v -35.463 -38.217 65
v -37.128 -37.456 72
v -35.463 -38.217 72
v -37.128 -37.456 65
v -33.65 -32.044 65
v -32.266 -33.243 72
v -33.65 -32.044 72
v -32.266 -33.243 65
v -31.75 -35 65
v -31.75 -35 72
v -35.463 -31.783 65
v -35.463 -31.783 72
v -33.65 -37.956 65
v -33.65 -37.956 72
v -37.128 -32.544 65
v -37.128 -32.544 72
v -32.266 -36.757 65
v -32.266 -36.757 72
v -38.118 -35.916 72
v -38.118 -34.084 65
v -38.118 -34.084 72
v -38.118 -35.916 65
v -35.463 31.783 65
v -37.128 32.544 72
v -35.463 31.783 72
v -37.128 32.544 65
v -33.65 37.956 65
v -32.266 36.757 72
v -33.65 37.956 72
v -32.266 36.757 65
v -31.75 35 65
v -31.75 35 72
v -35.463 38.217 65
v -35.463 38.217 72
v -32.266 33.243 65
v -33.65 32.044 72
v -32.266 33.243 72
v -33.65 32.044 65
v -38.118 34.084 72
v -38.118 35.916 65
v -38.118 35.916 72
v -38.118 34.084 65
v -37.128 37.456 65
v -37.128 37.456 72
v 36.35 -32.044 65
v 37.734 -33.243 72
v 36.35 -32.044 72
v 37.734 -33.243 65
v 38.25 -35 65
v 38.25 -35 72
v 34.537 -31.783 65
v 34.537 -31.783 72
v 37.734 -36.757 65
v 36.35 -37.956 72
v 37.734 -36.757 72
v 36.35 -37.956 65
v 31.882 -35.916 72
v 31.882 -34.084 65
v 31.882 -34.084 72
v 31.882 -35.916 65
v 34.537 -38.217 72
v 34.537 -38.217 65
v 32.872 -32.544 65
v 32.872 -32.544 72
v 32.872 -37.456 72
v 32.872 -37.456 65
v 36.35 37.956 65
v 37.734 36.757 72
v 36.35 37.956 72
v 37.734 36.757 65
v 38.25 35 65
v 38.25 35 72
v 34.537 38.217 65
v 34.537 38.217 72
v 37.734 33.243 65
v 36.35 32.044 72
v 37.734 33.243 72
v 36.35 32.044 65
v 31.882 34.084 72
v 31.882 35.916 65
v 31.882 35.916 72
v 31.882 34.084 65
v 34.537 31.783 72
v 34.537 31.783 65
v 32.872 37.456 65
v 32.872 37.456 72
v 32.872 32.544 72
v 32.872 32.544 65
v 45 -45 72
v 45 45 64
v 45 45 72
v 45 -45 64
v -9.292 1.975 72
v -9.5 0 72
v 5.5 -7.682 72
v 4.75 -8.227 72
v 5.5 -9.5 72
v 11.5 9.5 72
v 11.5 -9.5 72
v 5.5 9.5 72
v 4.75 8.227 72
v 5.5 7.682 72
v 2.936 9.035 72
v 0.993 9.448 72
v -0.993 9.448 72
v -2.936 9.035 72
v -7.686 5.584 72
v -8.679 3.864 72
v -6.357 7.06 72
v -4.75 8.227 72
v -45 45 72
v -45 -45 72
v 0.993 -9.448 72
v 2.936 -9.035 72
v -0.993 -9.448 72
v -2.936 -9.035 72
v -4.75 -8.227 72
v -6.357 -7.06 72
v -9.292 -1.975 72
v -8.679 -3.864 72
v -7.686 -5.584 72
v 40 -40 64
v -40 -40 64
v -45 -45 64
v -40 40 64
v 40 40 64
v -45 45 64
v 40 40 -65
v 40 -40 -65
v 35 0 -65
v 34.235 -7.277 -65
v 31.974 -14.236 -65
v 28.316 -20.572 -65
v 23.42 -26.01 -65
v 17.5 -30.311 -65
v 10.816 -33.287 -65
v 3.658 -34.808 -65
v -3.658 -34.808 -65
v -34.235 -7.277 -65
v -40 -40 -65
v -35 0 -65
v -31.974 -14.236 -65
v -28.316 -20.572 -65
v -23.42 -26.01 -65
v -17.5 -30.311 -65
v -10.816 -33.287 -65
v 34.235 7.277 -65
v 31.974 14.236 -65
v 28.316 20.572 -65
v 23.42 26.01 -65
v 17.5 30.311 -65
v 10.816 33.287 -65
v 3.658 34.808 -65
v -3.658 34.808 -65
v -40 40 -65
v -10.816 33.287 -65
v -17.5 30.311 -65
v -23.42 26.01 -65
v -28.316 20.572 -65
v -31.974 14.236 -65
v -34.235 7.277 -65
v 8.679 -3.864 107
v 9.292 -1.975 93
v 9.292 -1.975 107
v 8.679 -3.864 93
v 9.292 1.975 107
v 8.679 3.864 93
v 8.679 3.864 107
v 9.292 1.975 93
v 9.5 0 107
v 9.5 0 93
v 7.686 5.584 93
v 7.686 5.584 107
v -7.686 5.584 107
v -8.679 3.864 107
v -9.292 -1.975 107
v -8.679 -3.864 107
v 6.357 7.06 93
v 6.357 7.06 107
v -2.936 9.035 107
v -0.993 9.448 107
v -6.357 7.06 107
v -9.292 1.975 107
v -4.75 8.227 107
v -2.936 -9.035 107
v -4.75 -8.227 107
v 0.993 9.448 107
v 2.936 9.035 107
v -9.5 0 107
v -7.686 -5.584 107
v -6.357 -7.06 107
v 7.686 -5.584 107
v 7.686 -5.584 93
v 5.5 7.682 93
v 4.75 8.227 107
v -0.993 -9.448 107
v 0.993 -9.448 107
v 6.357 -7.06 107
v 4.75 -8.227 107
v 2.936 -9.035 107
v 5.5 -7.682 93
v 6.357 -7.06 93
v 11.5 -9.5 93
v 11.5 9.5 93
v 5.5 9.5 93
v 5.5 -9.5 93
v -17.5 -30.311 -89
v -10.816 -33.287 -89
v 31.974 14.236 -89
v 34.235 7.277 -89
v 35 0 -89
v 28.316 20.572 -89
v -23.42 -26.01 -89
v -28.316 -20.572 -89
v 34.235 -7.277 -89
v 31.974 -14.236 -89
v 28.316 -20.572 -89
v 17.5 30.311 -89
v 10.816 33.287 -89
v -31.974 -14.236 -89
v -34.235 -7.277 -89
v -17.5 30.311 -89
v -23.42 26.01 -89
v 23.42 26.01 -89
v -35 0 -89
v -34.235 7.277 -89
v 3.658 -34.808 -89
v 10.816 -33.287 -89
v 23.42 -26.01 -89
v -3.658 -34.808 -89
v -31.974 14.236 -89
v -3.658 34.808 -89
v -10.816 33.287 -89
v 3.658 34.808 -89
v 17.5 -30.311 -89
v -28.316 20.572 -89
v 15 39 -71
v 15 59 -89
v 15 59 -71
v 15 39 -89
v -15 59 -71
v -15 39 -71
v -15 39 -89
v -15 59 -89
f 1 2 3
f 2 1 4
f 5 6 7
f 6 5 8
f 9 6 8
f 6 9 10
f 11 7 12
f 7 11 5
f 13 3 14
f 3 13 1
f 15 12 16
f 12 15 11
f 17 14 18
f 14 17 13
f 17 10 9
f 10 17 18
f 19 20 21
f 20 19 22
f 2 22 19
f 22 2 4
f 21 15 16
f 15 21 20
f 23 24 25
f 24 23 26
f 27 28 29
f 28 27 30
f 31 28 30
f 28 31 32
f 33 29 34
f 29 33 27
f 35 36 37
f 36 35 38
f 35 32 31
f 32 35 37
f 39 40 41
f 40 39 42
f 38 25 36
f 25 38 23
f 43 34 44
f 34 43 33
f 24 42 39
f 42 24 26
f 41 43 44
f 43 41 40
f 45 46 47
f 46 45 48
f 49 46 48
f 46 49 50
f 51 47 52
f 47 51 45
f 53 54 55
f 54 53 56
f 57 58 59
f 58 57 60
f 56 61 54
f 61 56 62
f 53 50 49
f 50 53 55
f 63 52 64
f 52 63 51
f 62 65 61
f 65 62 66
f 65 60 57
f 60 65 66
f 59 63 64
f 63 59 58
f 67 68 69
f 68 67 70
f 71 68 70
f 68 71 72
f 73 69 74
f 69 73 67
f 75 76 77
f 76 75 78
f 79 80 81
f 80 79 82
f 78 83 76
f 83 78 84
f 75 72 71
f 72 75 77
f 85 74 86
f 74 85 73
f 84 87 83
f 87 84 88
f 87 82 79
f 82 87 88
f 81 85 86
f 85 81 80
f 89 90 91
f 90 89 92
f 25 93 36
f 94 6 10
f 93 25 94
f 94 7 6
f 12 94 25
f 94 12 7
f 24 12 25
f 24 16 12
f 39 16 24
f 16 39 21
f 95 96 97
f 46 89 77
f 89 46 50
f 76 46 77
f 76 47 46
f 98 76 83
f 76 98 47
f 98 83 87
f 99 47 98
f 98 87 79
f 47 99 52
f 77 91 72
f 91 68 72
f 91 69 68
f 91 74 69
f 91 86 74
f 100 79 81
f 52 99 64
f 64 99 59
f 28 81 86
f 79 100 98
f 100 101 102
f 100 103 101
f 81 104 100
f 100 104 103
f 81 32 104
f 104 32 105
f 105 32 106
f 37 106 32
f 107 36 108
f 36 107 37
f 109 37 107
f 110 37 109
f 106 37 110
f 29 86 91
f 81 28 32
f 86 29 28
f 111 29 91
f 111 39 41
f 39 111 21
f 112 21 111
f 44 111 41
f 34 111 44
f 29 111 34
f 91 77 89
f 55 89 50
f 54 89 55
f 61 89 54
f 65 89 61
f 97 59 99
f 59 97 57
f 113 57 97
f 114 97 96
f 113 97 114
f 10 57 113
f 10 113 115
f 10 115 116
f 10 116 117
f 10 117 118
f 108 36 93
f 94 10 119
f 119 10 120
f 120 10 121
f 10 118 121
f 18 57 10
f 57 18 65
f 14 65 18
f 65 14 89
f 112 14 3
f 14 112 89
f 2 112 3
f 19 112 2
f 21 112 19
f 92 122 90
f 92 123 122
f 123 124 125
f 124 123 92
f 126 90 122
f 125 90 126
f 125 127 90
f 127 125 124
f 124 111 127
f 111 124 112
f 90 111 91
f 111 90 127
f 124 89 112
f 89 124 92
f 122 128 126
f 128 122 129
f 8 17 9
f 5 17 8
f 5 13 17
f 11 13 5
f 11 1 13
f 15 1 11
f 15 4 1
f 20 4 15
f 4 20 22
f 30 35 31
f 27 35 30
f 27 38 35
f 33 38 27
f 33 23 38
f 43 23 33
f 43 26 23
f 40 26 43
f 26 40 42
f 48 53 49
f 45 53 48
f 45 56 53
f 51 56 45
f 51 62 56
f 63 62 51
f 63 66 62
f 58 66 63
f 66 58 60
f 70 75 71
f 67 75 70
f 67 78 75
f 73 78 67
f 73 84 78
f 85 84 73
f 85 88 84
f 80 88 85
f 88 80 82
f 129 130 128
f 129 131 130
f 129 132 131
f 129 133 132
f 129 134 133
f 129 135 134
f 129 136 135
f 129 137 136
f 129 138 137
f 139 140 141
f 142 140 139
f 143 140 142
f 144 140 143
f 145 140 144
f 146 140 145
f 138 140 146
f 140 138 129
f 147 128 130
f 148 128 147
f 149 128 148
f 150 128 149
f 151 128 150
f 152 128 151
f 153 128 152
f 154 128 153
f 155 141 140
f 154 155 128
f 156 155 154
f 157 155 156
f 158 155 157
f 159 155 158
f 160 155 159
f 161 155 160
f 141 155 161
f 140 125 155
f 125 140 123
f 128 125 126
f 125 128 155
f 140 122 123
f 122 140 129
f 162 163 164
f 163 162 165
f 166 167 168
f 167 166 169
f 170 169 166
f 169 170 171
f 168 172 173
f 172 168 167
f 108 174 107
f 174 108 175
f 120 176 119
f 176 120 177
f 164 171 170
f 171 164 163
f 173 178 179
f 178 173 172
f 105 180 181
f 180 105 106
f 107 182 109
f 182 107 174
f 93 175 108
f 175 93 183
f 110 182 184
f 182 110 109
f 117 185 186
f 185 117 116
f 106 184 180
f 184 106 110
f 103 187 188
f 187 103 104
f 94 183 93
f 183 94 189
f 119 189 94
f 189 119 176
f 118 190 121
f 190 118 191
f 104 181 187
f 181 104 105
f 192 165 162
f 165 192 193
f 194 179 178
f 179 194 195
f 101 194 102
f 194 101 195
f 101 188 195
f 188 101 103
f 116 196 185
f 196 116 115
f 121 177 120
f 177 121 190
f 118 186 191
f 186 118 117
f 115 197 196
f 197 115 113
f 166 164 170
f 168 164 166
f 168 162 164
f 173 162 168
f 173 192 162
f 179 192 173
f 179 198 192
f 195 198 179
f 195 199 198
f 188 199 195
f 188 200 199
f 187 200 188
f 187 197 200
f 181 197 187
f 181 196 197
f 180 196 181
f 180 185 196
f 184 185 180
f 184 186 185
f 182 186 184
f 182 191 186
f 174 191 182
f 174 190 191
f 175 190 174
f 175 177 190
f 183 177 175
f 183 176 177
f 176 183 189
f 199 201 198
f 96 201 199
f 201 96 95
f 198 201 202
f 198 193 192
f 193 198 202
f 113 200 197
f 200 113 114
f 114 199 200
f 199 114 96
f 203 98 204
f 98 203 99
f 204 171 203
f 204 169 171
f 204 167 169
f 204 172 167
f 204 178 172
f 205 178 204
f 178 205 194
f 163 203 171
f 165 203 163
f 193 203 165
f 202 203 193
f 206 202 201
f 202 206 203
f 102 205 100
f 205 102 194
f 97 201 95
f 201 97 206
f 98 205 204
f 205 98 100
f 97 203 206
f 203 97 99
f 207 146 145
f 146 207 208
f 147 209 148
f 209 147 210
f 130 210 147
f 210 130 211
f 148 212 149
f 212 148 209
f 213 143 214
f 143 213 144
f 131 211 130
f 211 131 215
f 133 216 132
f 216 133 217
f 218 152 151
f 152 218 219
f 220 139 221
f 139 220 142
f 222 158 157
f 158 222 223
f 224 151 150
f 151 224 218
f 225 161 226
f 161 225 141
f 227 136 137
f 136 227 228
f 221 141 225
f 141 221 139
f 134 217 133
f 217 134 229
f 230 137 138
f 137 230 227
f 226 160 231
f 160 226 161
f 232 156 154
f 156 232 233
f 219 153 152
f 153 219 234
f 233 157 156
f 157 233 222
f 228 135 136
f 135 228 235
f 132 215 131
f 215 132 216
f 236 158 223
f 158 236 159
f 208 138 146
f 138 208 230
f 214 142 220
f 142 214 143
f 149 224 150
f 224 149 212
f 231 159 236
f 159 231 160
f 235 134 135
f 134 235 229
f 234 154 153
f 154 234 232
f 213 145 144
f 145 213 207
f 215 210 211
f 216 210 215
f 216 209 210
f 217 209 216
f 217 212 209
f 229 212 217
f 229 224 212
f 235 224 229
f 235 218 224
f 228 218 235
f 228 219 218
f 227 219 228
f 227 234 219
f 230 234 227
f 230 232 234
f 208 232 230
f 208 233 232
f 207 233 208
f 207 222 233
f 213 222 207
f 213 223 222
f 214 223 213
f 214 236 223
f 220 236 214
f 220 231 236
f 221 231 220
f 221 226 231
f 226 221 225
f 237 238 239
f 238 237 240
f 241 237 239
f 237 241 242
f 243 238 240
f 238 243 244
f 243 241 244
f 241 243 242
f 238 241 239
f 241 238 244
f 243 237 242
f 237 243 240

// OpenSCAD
// Parameters
motor_frame_size_mm = 80; //[40:160:1]
housing_width_mm = 80; //[40:160:1]
housing_height_mm = 80; //[40:160:1]
body_length_mm = 130; //[65:260:1]
flange_thickness_mm = 8; //[4:16:1]
flange_outer_size_mm = 90; //[45:180:1]
mount_hole_count = 4; //[4:4:1]
mount_hole_pitch_mm = 70; //[35:140:1]
mount_hole_diameter_mm = 6.5; //[3:13:0.1]
shaft_diameter_mm = 19; //[9.5:38:0.1]
shaft_protrusion_mm = 35; //[18:70:1]
shaft_key_width_mm = 6; //[3:12:0.1]
shaft_key_height_mm = 2; //[1:4:0.1]
rear_cap_length_mm = 25; //[12:50:1]
rear_cap_diameter_mm = 70; //[35:140:1]
connector_width_mm = 30; //[15:60:1]
connector_height_mm = 20; //[10:40:1]
connector_depth_mm = 18; //[9:36:1]
corner_fillet_radius_mm = 2; //[0:6:0.5]
overlap_mm = 1; //[0.5:2:0.1]
overall_length_mm = 163; //[82:326:1]

// Servo Motor - complete geometry
module servo_motor() {
  color([0.15, 0.2, 0.35]) {
    // Main housing
    translate([0, 0, 0])
      cube([housing_width_mm, housing_height_mm, body_length_mm], center=true);

    // Front flange/faceplate with mounting holes
    difference() {
      translate([0, 0, body_length_mm/2 + flange_thickness_mm/2 - overlap_mm])
        cube([flange_outer_size_mm, flange_outer_size_mm, flange_thickness_mm], center=true);
      for (x = [-mount_hole_pitch_mm/2, mount_hole_pitch_mm/2])
        for (y = [-mount_hole_pitch_mm/2, mount_hole_pitch_mm/2])
          translate([x, y, body_length_mm/2 + flange_thickness_mm/2 - overlap_mm])
            cylinder(r=mount_hole_diameter_mm/2, h=flange_thickness_mm + overlap_mm*4, center=true);
    }

    // Output shaft
    color("Silver")
    translate([0, 0, body_length_mm/2 + flange_thickness_mm + shaft_protrusion_mm/2 - overlap_mm])
      cylinder(r=shaft_diameter_mm/2, h=shaft_protrusion_mm, center=true);

    // Shaft key/flat
    translate([shaft_diameter_mm/2 - shaft_key_height_mm/2, 0, body_length_mm/2 + flange_thickness_mm + (shaft_protrusion_mm*0.6)/2 - overlap_mm])
      cube([shaft_key_width_mm, shaft_diameter_mm, shaft_protrusion_mm*0.6], center=true);

    // Rear cap/encoder housing
    translate([0, 0, -body_length_mm/2 - rear_cap_length_mm/2 + overlap_mm])
      cylinder(r=rear_cap_diameter_mm/2, h=rear_cap_length_mm, center=true);

    // Cable connector block
    translate([0, housing_height_mm/2 + connector_height_mm/2 - overlap_mm, -body_length_mm/2 - rear_cap_length_mm + connector_depth_mm/2 + overlap_mm])
      cube([connector_width_mm, connector_height_mm, connector_depth_mm], center=true);

    // Corner details on front flange
    for (x = [-1, 1])
      for (y = [-1, 1])
        translate([x * (flange_outer_size_mm/2 - corner_fillet_radius_mm), y * (flange_outer_size_mm/2 - corner_fillet_radius_mm), body_length_mm/2 + flange_thickness_mm/2 - overlap_mm])
          cube([corner_fillet_radius_mm*2, corner_fillet_radius_mm*2, flange_thickness_mm], center=true);
  }
}

// Assembly
module assembly() {
  servo_motor();
}

assembly();
